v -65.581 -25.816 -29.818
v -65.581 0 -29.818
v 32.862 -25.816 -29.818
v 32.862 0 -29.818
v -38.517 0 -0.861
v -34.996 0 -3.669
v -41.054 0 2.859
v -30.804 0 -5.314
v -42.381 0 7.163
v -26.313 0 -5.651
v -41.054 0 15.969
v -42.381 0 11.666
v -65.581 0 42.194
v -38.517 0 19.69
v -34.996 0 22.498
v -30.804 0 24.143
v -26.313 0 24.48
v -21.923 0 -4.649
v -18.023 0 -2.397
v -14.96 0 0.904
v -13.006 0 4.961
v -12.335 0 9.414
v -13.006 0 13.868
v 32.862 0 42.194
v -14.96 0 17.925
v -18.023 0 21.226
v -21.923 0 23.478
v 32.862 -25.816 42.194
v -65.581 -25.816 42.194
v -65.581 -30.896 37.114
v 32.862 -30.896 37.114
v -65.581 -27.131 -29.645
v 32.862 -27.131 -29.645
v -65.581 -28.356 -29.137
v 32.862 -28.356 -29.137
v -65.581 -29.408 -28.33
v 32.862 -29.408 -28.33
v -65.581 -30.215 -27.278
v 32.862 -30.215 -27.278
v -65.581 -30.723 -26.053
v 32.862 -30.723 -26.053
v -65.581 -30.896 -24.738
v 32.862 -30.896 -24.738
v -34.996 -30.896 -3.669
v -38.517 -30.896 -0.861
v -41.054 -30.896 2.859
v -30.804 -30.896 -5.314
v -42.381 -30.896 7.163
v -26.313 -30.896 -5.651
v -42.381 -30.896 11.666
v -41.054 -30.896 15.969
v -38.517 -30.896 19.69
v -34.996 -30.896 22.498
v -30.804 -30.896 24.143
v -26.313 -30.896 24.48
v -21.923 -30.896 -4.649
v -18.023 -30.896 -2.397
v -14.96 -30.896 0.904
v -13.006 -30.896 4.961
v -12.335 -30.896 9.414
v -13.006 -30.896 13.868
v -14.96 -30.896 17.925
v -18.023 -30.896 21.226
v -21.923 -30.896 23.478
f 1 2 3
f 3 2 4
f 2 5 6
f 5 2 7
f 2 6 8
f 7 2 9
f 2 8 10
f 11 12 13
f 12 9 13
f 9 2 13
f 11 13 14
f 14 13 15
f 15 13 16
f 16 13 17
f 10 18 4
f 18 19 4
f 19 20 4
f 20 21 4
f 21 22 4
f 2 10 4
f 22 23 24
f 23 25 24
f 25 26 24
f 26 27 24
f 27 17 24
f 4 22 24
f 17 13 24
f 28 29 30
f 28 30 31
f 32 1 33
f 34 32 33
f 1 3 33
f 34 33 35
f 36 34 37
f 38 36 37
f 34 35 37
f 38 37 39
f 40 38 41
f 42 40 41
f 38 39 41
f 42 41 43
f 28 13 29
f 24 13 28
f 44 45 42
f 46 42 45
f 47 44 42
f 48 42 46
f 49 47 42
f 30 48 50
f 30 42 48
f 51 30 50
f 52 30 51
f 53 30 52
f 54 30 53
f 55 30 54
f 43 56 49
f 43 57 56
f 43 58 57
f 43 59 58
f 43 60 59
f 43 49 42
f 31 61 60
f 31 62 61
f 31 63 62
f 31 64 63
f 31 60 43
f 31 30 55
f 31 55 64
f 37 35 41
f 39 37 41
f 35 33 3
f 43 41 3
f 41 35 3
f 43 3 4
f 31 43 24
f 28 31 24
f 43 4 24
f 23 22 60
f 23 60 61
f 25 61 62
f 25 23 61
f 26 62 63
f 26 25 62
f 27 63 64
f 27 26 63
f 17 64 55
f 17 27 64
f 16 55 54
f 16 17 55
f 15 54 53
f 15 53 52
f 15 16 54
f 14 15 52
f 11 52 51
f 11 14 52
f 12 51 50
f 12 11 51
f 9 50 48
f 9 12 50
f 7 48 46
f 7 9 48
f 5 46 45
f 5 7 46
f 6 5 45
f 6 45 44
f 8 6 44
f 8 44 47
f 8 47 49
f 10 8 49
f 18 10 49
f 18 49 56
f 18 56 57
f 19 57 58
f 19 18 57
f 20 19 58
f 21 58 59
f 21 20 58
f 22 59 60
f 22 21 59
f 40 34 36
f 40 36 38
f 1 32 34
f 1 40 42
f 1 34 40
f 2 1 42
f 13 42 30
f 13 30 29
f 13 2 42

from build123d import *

# Parameters (mm, degrees)
F0_W     = 98.442565
F0_H     = 72.012099
F0_R     = 15.107645
F1_DEPTH = 30.8957
F2_R     = 5.08
F3_SIZE  = 5.08


with BuildPart() as f1:
    # F0 (on Front) → F1 (new body)
    with BuildSketch(Plane.XZ):
        with Locations((-16.359476, 6.18827)):
            Rectangle(F0_W, F0_H)
        with Locations((-27.442385, 9.414453)):
            Circle(F0_R, mode=Mode.SUBTRACT)
    extrude(amount=F1_DEPTH)

    # F2
    f2_edges = [f1.edges().sort_by_distance(p)[0] for p in [
        (-16.359476, -30.8957, -29.817779),
    ]]
    fillet(f2_edges, radius=F2_R)

    # F3
    f3_edges = [f1.edges().sort_by_distance(p)[0] for p in [
        (-16.359476, -30.8957, 42.19432),
    ]]
    chamfer(f3_edges, length=F3_SIZE)


solid = f1.part
